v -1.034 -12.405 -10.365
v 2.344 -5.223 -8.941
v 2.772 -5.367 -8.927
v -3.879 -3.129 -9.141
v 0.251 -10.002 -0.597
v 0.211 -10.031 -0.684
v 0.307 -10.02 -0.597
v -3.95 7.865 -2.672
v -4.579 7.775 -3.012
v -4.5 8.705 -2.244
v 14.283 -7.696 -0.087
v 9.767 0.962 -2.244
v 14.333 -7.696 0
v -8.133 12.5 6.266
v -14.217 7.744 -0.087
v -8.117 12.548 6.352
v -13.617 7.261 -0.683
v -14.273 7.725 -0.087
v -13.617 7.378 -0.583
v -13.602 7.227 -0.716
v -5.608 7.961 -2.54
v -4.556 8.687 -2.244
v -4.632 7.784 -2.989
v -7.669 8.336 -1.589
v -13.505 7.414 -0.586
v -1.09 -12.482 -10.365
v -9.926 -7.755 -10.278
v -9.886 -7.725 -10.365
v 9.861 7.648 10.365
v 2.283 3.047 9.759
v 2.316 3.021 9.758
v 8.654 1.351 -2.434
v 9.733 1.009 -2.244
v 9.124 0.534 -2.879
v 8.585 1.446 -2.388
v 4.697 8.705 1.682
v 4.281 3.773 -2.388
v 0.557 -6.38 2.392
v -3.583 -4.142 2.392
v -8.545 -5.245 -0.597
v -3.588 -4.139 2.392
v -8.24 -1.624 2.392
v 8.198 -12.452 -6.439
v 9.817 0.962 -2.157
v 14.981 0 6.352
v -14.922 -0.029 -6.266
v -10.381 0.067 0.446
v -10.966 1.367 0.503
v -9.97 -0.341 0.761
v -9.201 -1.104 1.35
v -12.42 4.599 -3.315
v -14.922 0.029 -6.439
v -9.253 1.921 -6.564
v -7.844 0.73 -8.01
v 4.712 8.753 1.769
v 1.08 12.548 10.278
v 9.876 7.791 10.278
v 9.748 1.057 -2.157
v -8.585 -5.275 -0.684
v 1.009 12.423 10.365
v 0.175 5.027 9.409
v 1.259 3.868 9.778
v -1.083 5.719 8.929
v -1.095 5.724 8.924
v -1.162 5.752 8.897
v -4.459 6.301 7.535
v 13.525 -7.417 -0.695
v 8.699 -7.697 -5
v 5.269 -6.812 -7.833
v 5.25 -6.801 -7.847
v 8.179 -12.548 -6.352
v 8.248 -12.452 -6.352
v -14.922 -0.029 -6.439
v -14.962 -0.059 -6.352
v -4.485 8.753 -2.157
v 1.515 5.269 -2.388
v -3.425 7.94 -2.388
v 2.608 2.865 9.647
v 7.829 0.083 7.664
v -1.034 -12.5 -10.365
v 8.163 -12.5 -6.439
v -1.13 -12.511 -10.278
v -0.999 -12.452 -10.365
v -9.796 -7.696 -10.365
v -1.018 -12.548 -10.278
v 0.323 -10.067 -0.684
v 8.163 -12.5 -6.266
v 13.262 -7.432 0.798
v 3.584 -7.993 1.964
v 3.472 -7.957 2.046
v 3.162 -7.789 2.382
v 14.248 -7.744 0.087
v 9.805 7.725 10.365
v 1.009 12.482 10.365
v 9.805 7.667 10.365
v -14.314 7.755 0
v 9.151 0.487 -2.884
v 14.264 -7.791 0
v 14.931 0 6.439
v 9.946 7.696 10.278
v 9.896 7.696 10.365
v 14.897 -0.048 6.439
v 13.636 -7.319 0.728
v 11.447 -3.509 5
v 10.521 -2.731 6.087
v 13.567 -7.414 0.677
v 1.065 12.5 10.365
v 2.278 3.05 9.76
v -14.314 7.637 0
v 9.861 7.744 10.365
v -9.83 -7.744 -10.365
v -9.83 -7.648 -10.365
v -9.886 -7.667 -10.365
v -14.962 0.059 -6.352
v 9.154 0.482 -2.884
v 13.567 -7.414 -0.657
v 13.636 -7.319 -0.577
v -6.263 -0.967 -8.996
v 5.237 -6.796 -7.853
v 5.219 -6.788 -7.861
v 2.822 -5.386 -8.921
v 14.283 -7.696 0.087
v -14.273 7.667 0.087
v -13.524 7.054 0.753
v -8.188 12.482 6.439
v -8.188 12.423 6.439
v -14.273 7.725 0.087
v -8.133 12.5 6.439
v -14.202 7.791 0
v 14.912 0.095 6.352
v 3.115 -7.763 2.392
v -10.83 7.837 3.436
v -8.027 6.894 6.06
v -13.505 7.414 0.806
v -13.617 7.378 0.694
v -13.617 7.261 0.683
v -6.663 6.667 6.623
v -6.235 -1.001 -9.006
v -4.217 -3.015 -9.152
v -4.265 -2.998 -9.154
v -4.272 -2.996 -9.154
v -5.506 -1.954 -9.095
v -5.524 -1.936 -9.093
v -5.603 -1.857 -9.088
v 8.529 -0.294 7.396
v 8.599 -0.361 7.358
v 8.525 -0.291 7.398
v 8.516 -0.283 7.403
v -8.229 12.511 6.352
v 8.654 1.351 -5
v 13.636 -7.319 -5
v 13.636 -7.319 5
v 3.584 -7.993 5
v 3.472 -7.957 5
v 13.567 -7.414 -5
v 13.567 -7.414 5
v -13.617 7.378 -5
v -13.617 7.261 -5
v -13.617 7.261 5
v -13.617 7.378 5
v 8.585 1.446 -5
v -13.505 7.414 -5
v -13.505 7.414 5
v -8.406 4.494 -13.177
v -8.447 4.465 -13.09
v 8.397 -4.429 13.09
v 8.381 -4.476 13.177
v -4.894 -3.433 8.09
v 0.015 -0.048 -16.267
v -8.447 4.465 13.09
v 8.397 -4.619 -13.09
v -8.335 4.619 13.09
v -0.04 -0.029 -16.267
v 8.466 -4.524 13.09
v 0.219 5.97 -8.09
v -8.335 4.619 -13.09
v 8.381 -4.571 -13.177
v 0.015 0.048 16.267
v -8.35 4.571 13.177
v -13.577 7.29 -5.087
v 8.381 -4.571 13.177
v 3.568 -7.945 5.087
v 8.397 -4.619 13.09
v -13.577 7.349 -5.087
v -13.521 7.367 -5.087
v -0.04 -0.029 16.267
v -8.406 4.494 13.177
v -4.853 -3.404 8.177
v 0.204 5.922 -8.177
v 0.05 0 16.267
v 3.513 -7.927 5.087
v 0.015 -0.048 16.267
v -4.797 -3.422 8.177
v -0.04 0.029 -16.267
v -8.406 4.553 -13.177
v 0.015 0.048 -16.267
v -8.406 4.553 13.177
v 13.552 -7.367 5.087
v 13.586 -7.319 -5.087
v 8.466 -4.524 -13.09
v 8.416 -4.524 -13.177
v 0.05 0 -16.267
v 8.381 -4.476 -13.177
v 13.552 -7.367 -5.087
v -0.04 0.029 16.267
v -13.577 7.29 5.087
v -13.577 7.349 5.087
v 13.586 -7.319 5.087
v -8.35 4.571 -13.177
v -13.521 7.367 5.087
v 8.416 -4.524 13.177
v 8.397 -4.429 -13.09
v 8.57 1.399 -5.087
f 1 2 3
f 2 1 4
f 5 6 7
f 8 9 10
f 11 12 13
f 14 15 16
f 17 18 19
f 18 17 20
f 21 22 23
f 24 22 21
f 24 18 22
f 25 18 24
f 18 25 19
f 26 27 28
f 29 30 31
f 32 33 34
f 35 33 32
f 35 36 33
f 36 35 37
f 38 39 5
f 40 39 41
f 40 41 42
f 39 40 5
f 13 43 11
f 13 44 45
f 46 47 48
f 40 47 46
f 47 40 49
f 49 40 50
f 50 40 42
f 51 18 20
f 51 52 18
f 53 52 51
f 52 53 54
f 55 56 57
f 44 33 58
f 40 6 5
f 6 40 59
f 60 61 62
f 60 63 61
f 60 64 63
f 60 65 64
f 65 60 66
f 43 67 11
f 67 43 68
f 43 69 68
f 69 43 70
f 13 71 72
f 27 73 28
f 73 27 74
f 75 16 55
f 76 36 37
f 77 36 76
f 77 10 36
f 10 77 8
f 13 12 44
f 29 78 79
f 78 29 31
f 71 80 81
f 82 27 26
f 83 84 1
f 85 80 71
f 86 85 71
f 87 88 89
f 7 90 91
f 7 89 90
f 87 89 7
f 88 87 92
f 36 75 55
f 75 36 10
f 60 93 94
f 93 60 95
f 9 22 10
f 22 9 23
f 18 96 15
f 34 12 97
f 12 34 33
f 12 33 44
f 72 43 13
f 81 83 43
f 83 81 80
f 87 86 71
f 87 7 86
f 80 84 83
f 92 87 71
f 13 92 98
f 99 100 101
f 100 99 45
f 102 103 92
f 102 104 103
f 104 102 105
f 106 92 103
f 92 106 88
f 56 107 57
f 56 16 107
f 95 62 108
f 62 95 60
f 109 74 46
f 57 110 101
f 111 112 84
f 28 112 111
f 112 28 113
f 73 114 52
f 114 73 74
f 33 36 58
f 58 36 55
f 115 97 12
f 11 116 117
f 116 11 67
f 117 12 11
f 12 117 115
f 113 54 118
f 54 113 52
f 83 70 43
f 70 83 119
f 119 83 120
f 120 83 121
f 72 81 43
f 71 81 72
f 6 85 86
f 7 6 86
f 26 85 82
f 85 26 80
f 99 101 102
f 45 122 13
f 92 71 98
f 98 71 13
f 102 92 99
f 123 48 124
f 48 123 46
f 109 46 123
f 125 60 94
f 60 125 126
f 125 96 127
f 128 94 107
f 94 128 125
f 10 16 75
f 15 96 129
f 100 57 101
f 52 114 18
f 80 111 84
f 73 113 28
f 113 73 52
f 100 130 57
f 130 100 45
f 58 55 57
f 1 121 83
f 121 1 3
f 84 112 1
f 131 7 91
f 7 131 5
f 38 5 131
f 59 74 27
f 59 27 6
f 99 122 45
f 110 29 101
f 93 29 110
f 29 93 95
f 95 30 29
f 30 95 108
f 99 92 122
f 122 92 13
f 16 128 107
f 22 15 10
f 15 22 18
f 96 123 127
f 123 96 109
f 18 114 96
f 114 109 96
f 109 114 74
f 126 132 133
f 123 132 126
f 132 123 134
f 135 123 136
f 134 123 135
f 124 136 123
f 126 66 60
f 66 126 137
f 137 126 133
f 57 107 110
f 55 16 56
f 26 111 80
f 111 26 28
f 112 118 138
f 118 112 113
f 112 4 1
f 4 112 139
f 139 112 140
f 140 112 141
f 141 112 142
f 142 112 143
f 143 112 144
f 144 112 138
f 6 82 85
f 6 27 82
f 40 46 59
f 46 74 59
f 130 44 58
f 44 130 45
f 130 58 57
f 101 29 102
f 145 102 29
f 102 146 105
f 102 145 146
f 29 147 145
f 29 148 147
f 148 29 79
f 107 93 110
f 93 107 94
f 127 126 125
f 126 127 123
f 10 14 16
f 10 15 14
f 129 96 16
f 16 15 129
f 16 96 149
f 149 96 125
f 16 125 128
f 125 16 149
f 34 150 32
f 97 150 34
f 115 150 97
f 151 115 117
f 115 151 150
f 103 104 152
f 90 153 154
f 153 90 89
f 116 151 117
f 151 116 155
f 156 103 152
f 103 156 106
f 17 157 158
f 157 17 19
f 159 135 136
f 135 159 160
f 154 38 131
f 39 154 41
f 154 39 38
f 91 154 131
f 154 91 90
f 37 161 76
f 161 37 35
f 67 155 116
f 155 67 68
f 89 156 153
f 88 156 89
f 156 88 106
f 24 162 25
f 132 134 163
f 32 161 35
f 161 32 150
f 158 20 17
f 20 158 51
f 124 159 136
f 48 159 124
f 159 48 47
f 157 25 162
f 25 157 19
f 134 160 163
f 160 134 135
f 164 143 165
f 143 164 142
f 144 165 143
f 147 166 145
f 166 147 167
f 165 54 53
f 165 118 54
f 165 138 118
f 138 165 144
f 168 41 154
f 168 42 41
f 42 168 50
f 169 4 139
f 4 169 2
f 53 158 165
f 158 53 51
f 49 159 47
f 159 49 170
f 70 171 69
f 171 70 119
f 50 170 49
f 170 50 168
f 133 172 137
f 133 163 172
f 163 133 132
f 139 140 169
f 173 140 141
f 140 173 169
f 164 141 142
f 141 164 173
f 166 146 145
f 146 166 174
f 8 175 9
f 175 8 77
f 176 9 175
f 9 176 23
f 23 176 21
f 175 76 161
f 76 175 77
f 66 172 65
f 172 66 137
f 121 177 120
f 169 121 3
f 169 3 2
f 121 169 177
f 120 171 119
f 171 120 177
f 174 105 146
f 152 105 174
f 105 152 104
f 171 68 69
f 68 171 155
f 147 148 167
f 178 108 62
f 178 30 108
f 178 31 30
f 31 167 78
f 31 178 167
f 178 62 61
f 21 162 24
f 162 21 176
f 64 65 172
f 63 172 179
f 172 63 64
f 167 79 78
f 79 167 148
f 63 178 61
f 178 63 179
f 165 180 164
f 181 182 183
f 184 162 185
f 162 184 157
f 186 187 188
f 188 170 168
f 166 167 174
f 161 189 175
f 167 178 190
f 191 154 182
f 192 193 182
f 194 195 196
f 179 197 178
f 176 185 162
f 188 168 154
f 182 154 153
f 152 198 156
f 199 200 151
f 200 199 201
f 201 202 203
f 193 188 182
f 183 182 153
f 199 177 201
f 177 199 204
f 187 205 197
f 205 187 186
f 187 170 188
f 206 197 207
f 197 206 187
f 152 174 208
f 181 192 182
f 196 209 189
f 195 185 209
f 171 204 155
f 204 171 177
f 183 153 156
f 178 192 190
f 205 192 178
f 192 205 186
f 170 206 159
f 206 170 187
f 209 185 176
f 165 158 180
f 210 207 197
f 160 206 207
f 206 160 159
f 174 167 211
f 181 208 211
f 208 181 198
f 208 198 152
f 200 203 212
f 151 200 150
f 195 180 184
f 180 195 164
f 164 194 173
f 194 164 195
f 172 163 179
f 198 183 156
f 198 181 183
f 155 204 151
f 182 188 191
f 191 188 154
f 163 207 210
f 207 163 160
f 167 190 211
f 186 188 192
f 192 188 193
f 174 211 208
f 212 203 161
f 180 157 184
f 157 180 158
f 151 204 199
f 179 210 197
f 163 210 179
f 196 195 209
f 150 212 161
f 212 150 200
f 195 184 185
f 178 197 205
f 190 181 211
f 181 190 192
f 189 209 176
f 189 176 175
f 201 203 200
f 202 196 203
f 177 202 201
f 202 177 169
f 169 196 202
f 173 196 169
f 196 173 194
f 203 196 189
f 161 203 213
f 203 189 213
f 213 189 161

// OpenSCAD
// Auto-generated OpenSCAD file

    inner_points = 10*[[-1.7845387792055995e-15, -1.859095349230593e-15, -1.618033988749895], [1.7845387792055995e-15, 1.859095349230593e-15, 1.618033988749895], [-1.3536265463755464, 0.7319352168718941, -0.49999999999999933], [-1.3536265463755455, 0.7319352168718953, 0.5000000000000007], [1.3536265463755455, -0.7319352168718953, -0.5000000000000007], [1.3536265463755464, -0.7319352168718941, 0.49999999999999933], [-0.8365872137342245, 0.45236084158985485, -1.309016994374947], [-0.8365872137342216, 0.4523608415898579, 1.309016994374948], [0.8365872137342216, -0.4523608415898579, -1.309016994374948], [0.8365872137342245, -0.45236084158985485, 1.309016994374947], [-0.9983252747658171, -0.0578502010692763, 1.1675275179479784e-15], [-0.49820742844767774, 0.8670578747924227, -4.467599515296164e-16], [-0.48128594212449544, -0.3374245763513155, -0.8090169943749466], [0.018831904193644222, 0.5874834995103835, -0.8090169943749481], [-0.4812859421244936, -0.3374245763513135, 0.8090169943749483], [0.018831904193646, 0.5874834995103853, 0.8090169943749468], [0.35530127160972824, -0.7897854179411714, -0.4999999999999995], [0.8554191179278678, 0.13512265792052747, -0.5000000000000011], [0.3553012716097293, -0.7897854179411703, 0.5000000000000006], [0.8554191179278688, 0.13512265792052863, 0.4999999999999989]];

    outer_points = 10*[[-1.4881280115199031, 0.0, -0.6352235906196446], [1.4881280115199031, 0.0, 0.6352235906196446], [-0.10491467048796077, -1.2452425677866739, -1.0278121657376647], [0.8147990202421345, -1.2452425677866739, -0.6352223962789754], [-0.8147990202421345, 1.2452425677866739, 0.6352223962789754], [0.10491467048796077, 1.2452425677866739, 1.0278121657376647], [-0.9845545230101506, -0.7696022311303593, -1.027812621935206], [1.423287179239848, -0.7696022311303593, 7.381431278430384e-07], [-1.423287179239848, 0.7696022311303593, -7.381431278430384e-07], [0.9845545230101506, 0.7696022311303593, 1.027812621935206], [0.36322496660595616, -0.37947419135933846, -0.8509212429633416], [0.029189450705503803, -0.9972321321950521, -0.06838165313313897], [-0.5164148859162335, 0.09616614529697598, -0.8509216991608831], [-0.8504504018166859, -0.5215917955387377, -0.06838210933068053], [0.9717131256036696, 0.09616614529697598, -0.2156981085412385], [0.6376776097032173, -0.5215917955387377, 0.566841481288964], [-0.45157405363617825, 0.8657683764273354, -0.21569884668436626], [-0.7856095695366306, 0.24801043559162173, 0.5668407431458362], [0.468139637093917, 0.8657683764273354, 0.17689092277432297], [0.1341041211934646, 0.24801043559162173, 0.9594305126045255]];

    // Convex hull for inner set (I)
    module inner_hull() {
        hull() {
            for (p = inner_points) {
                translate(p) sphere(r=0.1);
            }
        }
    }

    // Convex hull for outer set (O) minus inner hull (O \ I)
    module outer_minus_inner() {
        difference() {
            hull() {
                for (p = outer_points) {
                    translate(p) sphere(r=0.1);
                }
            }
            inner_hull(); // Subtract inner hull
        }
    }

    // Convex hull for outer set (O) minus all translated inner hulls
    module outer_minus_AllTranslationInner() {
        difference() {
            hull() {
                for (p = outer_points) {
                    translate(p) sphere(r=0.1);
                }
            }
            hull() {
                translate([0,0,50]) inner_hull();
                translate([0,0,-50]) inner_hull();
            }; // Subtract translated inner hulls
        }
    }

    // Difference between outer_minus_inner and outer_minus_AllTranslationInner
    module outer_minus_inner_diff() {
        difference() {
            // Outer minus inner
            difference() {
                hull() {
                    for (p = outer_points) {
                        translate(p) sphere(r=0.1);
                    }
                }
                inner_hull();
            }

            // Subtract Outer minus AllTranslationInner
            difference() {
                hull() {
                    for (p = outer_points) {
                        translate(p) sphere(r=0.1);
                    }
                }
                hull() {
                    translate([0,0,50]) inner_hull();
                    translate([0,0,-50]) inner_hull();
                };
            }
        }
    }

    // Rendering all with colors applied
    color([1, 0, 0, 0.5]) inner_hull(); // Transparent red
    color([0, 1, 0, 1]) outer_minus_AllTranslationInner(); // Opaque green
    color([1, 1, 0, 1]) outer_minus_inner_diff(); // Opaque yellow
    
